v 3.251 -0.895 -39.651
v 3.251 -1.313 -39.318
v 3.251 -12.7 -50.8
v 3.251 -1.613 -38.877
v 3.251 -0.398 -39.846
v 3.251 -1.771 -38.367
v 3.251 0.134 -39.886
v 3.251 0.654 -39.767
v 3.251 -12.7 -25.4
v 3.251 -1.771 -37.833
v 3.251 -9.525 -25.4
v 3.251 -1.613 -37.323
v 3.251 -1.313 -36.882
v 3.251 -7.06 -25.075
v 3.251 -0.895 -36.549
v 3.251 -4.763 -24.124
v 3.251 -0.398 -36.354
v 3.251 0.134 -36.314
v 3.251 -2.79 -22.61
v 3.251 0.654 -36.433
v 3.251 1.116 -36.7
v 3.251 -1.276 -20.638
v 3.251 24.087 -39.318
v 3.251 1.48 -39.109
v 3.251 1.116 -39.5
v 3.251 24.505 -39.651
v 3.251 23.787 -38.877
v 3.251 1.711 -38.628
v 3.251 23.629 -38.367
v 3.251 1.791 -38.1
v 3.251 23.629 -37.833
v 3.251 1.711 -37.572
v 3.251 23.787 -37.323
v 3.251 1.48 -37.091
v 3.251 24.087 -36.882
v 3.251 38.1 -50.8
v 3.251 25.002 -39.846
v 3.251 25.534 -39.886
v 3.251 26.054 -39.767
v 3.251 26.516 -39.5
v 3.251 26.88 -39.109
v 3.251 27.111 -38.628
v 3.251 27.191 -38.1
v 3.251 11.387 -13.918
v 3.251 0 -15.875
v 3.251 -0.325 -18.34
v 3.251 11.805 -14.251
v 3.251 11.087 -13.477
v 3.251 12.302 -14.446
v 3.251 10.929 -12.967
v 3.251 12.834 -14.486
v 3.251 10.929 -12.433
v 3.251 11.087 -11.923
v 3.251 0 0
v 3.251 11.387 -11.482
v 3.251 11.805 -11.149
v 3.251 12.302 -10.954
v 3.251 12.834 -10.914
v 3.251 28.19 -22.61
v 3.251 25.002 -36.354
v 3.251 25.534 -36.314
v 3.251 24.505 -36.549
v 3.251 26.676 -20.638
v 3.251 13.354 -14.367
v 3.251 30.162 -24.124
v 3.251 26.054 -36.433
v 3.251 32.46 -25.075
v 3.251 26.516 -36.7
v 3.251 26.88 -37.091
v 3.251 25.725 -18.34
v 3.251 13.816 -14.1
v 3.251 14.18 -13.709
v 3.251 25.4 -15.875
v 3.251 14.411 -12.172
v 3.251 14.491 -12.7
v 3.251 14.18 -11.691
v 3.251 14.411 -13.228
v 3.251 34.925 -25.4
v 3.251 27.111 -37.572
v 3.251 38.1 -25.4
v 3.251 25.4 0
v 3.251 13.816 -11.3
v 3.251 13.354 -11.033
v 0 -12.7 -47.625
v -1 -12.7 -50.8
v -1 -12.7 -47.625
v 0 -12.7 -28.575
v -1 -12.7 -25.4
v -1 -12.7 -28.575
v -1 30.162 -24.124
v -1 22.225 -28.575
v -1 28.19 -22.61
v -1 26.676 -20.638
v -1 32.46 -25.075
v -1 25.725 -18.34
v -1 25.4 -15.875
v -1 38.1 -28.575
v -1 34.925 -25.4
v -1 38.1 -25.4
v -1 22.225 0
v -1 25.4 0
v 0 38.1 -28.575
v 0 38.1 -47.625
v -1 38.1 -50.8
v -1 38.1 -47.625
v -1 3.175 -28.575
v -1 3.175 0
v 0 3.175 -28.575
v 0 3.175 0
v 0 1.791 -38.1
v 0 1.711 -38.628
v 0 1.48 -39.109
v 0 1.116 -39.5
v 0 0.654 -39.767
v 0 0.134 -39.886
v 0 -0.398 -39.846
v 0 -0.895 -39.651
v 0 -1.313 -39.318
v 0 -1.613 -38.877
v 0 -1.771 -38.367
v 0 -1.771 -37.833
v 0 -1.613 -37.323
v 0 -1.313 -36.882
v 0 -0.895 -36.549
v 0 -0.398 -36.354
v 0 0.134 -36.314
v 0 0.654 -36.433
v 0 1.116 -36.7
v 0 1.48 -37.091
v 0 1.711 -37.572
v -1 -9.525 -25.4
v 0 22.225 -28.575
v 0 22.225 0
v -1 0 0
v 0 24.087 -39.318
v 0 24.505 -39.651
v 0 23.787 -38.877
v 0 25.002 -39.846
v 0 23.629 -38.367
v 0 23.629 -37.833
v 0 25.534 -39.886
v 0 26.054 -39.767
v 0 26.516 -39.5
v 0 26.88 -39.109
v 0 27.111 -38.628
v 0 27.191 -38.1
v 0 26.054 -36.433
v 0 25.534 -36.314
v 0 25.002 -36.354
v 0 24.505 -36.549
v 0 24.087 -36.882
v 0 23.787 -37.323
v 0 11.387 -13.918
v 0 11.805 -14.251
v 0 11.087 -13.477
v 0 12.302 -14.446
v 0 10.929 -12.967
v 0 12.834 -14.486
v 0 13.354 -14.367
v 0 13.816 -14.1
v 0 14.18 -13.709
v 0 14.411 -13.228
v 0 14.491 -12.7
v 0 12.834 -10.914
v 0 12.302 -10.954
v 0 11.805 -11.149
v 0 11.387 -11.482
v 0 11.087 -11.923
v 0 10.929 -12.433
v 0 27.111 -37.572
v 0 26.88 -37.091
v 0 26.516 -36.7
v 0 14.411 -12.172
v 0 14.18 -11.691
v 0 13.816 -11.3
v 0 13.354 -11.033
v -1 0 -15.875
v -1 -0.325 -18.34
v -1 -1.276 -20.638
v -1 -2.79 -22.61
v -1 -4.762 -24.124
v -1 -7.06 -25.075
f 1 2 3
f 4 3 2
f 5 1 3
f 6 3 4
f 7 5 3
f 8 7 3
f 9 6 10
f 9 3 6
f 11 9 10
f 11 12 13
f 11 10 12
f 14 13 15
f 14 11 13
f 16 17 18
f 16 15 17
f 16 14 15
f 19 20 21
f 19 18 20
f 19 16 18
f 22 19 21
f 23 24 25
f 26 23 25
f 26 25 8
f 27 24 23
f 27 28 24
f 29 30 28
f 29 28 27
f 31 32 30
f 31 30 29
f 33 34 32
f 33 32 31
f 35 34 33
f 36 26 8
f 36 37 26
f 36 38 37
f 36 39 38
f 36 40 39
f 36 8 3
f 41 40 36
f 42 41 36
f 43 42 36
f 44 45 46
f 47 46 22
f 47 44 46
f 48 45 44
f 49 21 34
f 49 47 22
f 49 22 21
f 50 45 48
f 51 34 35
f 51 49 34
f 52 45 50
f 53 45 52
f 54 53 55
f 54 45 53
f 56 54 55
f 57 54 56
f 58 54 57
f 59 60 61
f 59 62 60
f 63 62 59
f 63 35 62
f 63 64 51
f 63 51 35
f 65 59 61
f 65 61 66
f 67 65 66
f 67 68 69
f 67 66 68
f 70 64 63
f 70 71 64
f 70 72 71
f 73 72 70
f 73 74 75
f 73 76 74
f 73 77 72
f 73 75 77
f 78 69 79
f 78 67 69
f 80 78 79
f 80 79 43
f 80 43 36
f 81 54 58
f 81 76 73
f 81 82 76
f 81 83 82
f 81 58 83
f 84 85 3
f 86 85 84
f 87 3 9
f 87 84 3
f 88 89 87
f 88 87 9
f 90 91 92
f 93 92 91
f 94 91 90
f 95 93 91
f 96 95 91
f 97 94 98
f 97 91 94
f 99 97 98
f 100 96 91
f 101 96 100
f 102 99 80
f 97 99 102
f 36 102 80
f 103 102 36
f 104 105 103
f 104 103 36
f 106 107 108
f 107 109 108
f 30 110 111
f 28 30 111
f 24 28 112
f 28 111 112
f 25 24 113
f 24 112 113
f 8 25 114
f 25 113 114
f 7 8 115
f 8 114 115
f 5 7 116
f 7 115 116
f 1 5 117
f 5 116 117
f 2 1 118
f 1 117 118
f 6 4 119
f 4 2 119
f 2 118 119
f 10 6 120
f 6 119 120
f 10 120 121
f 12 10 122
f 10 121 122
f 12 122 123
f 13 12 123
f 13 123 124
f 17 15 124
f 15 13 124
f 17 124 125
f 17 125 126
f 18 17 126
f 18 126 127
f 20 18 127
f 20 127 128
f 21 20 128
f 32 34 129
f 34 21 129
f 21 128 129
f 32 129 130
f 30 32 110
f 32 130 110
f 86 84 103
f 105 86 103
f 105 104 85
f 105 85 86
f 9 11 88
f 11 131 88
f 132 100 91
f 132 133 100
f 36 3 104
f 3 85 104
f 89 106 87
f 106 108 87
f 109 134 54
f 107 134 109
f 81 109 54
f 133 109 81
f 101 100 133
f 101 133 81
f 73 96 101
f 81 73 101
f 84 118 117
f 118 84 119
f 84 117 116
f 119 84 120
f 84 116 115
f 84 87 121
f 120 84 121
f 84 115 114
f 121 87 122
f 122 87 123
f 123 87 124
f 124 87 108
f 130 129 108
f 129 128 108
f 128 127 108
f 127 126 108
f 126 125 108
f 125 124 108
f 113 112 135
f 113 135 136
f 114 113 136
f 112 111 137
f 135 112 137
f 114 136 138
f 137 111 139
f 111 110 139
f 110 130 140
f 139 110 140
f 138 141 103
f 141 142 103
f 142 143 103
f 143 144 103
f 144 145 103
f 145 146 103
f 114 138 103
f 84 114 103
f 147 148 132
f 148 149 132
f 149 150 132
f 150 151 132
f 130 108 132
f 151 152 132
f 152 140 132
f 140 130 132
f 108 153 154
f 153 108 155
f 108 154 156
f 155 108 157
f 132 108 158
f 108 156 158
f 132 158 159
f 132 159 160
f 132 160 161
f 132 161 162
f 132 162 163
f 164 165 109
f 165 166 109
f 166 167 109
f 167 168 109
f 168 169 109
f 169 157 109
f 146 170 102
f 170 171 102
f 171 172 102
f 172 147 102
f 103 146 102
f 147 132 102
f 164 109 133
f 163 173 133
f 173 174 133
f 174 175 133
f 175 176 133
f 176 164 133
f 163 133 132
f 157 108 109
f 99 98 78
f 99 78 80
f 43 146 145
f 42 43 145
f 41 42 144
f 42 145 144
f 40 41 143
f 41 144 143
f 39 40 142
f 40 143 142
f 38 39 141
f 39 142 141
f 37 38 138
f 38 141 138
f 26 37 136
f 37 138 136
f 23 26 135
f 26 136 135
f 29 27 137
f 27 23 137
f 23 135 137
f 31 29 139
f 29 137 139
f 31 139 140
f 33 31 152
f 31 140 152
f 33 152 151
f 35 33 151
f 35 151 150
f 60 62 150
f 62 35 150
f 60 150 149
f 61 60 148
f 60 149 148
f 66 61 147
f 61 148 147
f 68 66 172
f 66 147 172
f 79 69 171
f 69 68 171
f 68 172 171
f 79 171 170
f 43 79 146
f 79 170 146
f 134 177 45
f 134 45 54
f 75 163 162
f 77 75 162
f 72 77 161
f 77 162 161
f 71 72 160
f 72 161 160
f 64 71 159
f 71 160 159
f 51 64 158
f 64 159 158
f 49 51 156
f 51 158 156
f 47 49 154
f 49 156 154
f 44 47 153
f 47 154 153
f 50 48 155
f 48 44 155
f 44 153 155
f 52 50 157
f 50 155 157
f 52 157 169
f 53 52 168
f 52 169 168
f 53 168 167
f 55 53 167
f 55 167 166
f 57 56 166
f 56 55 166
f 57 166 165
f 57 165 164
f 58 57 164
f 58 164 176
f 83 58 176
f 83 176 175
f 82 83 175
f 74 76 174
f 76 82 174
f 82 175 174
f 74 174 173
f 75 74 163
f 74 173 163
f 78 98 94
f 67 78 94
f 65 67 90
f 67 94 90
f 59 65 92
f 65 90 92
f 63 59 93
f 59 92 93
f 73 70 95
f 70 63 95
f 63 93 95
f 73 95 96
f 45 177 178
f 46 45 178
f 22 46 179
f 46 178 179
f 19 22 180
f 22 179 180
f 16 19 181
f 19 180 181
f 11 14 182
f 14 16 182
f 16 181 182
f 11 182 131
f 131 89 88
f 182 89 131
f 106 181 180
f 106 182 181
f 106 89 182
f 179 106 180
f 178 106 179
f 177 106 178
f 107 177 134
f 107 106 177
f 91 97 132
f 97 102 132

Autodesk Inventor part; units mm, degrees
ref_plane "YZ Plane" through (0, 0, 0) normal (1, 0, 0) x (0, 1, 0)
ref_plane "XZ Plane" through (0, 0, 0) normal (0, 1, 0) x (-1, 0, 0)
ref_plane "XY Plane" through (0, 0, 0) normal (0, 0, 1) x (1, 0, 0)
sketch "Sketch1" plane through (0, 0, 0) normal (1, 0, 0) x (0, 1, 0)
  circle A0 centre (0, -38.1) radius 1.7907
  circle A1 centre (12.7, -12.7) radius 1.7907
  circle A2 centre (25.4, -38.1) radius 1.7907
  line L0 (-12.7, -50.8) -> (38.1, -50.8)
  line L1 (38.1, -25.4) -> (38.1, -50.8)
  line L2 (34.925, -25.4) -> (38.1, -25.4)
  arc A3 (25.4, -15.875) -> (34.925, -25.4) centre (34.925, -15.875) ccw
  line L3 (25.4, -15.875) -> (25.4, 0)
  line L4 (0, 0) -> (25.4, 0)
  line L5 (0, -15.875) -> (0, 0)
  arc A4 (-9.525, -25.4) -> (0, -15.875) centre (-9.525, -15.875) ccw
  line L6 (-9.525, -25.4) -> (-12.7, -25.4)
  line L7 (-12.7, -50.8) -> (-12.7, -25.4)
  point P0 (12.7, -50.8)
extrude "Extrusion1" add sketch "Sketch1" along normal blind 3.2512
sketch "Sketch2" plane through (0, 0, 0) normal (-1, 0, 0) x (0, 0, 1)
  circle A0 centre (-38.1, 25.4) radius 1.7907 projected
  circle A1 centre (-12.7, 12.7) radius 1.7907 projected
  circle A2 centre (-38.1, 0) radius 1.7907 projected
  line L0 (-50.8, -12.7) -> (-50.8, 38.1) projected
  line L1 (-25.4, -12.7) -> (-50.8, -12.7) projected
  line L2 (-25.4, -9.525) -> (-25.4, -12.7) projected
  arc A3 (-15.875, 0) -> (-25.4, -9.525) centre (-15.875, -9.525) ccw projected
  line L3 (0, 0) -> (-15.875, 0) projected
  line L4 (0, 25.4) -> (0, 0) projected
  line L5 (-15.875, 25.4) -> (0, 25.4) projected
  arc A4 (-25.4, 34.925) -> (-15.875, 25.4) centre (-15.875, 34.925) ccw projected
  line L6 (-25.4, 38.1) -> (-25.4, 34.925) projected
  line L7 (-50.8, 38.1) -> (-25.4, 38.1) projected
  line L8 (0, 25.4) -> (0, 0) projected
  line L9 (0, 22.225) -> (-28.575, 22.225)
  line L10 (0, 3.175) -> (-28.575, 3.175)
  line L11 (-28.575, 38.1) -> (-28.575, 22.225)
  line L12 (-28.575, 3.175) -> (-28.575, -12.7)
  line L13 (-25.4, -12.7) -> (-50.8, -12.7) projected
  line L14 (-47.625, 2.0848) -> (-47.625, -12.7)
  line L15 (-47.625, 2.0848) -> (-47.625, 38.1)
  line L16 (-50.8, 38.1) -> (-25.4, 38.1) projected
  line L17 (-38.1, 38.1) -> (-38.1, 48.6626) construction
  line L18 (-38.1, 52.0515) -> (-28.575, 52.0515) construction
  line L19 (-38.1, 52.0515) -> (-47.625, 52.0515) construction
  line L20 (-38.1, -12.7) -> (-38.1, -13.4551) construction
  line L21 (-38.1, -13.4551) -> (-38.1, -16.9489) construction
  line L22 (-28.575, -16.9489) -> (-38.1, -16.9489) construction
  line L23 (-38.1, -16.9489) -> (-47.625, -16.9489) construction
  line L24 (0, 12.7) -> (-6.3454, 12.7) construction
  line L25 (-3.5322, 12.7) -> (-3.5322, 22.225) construction
  line L26 (-3.5322, 12.7) -> (-3.5322, 3.175) construction
  dimension "d2" = 19.05
  dimension "d3" = 19.05
extrude "Extrusion2" add sketch "Sketch2" along normal blind 1 contours L0 L7 L15 L14 L1 | L12 L10 L4 L3 A3 L2 L1 | L7 L6 A4 L5 L4 L9 L11
properties part number "side holders"
